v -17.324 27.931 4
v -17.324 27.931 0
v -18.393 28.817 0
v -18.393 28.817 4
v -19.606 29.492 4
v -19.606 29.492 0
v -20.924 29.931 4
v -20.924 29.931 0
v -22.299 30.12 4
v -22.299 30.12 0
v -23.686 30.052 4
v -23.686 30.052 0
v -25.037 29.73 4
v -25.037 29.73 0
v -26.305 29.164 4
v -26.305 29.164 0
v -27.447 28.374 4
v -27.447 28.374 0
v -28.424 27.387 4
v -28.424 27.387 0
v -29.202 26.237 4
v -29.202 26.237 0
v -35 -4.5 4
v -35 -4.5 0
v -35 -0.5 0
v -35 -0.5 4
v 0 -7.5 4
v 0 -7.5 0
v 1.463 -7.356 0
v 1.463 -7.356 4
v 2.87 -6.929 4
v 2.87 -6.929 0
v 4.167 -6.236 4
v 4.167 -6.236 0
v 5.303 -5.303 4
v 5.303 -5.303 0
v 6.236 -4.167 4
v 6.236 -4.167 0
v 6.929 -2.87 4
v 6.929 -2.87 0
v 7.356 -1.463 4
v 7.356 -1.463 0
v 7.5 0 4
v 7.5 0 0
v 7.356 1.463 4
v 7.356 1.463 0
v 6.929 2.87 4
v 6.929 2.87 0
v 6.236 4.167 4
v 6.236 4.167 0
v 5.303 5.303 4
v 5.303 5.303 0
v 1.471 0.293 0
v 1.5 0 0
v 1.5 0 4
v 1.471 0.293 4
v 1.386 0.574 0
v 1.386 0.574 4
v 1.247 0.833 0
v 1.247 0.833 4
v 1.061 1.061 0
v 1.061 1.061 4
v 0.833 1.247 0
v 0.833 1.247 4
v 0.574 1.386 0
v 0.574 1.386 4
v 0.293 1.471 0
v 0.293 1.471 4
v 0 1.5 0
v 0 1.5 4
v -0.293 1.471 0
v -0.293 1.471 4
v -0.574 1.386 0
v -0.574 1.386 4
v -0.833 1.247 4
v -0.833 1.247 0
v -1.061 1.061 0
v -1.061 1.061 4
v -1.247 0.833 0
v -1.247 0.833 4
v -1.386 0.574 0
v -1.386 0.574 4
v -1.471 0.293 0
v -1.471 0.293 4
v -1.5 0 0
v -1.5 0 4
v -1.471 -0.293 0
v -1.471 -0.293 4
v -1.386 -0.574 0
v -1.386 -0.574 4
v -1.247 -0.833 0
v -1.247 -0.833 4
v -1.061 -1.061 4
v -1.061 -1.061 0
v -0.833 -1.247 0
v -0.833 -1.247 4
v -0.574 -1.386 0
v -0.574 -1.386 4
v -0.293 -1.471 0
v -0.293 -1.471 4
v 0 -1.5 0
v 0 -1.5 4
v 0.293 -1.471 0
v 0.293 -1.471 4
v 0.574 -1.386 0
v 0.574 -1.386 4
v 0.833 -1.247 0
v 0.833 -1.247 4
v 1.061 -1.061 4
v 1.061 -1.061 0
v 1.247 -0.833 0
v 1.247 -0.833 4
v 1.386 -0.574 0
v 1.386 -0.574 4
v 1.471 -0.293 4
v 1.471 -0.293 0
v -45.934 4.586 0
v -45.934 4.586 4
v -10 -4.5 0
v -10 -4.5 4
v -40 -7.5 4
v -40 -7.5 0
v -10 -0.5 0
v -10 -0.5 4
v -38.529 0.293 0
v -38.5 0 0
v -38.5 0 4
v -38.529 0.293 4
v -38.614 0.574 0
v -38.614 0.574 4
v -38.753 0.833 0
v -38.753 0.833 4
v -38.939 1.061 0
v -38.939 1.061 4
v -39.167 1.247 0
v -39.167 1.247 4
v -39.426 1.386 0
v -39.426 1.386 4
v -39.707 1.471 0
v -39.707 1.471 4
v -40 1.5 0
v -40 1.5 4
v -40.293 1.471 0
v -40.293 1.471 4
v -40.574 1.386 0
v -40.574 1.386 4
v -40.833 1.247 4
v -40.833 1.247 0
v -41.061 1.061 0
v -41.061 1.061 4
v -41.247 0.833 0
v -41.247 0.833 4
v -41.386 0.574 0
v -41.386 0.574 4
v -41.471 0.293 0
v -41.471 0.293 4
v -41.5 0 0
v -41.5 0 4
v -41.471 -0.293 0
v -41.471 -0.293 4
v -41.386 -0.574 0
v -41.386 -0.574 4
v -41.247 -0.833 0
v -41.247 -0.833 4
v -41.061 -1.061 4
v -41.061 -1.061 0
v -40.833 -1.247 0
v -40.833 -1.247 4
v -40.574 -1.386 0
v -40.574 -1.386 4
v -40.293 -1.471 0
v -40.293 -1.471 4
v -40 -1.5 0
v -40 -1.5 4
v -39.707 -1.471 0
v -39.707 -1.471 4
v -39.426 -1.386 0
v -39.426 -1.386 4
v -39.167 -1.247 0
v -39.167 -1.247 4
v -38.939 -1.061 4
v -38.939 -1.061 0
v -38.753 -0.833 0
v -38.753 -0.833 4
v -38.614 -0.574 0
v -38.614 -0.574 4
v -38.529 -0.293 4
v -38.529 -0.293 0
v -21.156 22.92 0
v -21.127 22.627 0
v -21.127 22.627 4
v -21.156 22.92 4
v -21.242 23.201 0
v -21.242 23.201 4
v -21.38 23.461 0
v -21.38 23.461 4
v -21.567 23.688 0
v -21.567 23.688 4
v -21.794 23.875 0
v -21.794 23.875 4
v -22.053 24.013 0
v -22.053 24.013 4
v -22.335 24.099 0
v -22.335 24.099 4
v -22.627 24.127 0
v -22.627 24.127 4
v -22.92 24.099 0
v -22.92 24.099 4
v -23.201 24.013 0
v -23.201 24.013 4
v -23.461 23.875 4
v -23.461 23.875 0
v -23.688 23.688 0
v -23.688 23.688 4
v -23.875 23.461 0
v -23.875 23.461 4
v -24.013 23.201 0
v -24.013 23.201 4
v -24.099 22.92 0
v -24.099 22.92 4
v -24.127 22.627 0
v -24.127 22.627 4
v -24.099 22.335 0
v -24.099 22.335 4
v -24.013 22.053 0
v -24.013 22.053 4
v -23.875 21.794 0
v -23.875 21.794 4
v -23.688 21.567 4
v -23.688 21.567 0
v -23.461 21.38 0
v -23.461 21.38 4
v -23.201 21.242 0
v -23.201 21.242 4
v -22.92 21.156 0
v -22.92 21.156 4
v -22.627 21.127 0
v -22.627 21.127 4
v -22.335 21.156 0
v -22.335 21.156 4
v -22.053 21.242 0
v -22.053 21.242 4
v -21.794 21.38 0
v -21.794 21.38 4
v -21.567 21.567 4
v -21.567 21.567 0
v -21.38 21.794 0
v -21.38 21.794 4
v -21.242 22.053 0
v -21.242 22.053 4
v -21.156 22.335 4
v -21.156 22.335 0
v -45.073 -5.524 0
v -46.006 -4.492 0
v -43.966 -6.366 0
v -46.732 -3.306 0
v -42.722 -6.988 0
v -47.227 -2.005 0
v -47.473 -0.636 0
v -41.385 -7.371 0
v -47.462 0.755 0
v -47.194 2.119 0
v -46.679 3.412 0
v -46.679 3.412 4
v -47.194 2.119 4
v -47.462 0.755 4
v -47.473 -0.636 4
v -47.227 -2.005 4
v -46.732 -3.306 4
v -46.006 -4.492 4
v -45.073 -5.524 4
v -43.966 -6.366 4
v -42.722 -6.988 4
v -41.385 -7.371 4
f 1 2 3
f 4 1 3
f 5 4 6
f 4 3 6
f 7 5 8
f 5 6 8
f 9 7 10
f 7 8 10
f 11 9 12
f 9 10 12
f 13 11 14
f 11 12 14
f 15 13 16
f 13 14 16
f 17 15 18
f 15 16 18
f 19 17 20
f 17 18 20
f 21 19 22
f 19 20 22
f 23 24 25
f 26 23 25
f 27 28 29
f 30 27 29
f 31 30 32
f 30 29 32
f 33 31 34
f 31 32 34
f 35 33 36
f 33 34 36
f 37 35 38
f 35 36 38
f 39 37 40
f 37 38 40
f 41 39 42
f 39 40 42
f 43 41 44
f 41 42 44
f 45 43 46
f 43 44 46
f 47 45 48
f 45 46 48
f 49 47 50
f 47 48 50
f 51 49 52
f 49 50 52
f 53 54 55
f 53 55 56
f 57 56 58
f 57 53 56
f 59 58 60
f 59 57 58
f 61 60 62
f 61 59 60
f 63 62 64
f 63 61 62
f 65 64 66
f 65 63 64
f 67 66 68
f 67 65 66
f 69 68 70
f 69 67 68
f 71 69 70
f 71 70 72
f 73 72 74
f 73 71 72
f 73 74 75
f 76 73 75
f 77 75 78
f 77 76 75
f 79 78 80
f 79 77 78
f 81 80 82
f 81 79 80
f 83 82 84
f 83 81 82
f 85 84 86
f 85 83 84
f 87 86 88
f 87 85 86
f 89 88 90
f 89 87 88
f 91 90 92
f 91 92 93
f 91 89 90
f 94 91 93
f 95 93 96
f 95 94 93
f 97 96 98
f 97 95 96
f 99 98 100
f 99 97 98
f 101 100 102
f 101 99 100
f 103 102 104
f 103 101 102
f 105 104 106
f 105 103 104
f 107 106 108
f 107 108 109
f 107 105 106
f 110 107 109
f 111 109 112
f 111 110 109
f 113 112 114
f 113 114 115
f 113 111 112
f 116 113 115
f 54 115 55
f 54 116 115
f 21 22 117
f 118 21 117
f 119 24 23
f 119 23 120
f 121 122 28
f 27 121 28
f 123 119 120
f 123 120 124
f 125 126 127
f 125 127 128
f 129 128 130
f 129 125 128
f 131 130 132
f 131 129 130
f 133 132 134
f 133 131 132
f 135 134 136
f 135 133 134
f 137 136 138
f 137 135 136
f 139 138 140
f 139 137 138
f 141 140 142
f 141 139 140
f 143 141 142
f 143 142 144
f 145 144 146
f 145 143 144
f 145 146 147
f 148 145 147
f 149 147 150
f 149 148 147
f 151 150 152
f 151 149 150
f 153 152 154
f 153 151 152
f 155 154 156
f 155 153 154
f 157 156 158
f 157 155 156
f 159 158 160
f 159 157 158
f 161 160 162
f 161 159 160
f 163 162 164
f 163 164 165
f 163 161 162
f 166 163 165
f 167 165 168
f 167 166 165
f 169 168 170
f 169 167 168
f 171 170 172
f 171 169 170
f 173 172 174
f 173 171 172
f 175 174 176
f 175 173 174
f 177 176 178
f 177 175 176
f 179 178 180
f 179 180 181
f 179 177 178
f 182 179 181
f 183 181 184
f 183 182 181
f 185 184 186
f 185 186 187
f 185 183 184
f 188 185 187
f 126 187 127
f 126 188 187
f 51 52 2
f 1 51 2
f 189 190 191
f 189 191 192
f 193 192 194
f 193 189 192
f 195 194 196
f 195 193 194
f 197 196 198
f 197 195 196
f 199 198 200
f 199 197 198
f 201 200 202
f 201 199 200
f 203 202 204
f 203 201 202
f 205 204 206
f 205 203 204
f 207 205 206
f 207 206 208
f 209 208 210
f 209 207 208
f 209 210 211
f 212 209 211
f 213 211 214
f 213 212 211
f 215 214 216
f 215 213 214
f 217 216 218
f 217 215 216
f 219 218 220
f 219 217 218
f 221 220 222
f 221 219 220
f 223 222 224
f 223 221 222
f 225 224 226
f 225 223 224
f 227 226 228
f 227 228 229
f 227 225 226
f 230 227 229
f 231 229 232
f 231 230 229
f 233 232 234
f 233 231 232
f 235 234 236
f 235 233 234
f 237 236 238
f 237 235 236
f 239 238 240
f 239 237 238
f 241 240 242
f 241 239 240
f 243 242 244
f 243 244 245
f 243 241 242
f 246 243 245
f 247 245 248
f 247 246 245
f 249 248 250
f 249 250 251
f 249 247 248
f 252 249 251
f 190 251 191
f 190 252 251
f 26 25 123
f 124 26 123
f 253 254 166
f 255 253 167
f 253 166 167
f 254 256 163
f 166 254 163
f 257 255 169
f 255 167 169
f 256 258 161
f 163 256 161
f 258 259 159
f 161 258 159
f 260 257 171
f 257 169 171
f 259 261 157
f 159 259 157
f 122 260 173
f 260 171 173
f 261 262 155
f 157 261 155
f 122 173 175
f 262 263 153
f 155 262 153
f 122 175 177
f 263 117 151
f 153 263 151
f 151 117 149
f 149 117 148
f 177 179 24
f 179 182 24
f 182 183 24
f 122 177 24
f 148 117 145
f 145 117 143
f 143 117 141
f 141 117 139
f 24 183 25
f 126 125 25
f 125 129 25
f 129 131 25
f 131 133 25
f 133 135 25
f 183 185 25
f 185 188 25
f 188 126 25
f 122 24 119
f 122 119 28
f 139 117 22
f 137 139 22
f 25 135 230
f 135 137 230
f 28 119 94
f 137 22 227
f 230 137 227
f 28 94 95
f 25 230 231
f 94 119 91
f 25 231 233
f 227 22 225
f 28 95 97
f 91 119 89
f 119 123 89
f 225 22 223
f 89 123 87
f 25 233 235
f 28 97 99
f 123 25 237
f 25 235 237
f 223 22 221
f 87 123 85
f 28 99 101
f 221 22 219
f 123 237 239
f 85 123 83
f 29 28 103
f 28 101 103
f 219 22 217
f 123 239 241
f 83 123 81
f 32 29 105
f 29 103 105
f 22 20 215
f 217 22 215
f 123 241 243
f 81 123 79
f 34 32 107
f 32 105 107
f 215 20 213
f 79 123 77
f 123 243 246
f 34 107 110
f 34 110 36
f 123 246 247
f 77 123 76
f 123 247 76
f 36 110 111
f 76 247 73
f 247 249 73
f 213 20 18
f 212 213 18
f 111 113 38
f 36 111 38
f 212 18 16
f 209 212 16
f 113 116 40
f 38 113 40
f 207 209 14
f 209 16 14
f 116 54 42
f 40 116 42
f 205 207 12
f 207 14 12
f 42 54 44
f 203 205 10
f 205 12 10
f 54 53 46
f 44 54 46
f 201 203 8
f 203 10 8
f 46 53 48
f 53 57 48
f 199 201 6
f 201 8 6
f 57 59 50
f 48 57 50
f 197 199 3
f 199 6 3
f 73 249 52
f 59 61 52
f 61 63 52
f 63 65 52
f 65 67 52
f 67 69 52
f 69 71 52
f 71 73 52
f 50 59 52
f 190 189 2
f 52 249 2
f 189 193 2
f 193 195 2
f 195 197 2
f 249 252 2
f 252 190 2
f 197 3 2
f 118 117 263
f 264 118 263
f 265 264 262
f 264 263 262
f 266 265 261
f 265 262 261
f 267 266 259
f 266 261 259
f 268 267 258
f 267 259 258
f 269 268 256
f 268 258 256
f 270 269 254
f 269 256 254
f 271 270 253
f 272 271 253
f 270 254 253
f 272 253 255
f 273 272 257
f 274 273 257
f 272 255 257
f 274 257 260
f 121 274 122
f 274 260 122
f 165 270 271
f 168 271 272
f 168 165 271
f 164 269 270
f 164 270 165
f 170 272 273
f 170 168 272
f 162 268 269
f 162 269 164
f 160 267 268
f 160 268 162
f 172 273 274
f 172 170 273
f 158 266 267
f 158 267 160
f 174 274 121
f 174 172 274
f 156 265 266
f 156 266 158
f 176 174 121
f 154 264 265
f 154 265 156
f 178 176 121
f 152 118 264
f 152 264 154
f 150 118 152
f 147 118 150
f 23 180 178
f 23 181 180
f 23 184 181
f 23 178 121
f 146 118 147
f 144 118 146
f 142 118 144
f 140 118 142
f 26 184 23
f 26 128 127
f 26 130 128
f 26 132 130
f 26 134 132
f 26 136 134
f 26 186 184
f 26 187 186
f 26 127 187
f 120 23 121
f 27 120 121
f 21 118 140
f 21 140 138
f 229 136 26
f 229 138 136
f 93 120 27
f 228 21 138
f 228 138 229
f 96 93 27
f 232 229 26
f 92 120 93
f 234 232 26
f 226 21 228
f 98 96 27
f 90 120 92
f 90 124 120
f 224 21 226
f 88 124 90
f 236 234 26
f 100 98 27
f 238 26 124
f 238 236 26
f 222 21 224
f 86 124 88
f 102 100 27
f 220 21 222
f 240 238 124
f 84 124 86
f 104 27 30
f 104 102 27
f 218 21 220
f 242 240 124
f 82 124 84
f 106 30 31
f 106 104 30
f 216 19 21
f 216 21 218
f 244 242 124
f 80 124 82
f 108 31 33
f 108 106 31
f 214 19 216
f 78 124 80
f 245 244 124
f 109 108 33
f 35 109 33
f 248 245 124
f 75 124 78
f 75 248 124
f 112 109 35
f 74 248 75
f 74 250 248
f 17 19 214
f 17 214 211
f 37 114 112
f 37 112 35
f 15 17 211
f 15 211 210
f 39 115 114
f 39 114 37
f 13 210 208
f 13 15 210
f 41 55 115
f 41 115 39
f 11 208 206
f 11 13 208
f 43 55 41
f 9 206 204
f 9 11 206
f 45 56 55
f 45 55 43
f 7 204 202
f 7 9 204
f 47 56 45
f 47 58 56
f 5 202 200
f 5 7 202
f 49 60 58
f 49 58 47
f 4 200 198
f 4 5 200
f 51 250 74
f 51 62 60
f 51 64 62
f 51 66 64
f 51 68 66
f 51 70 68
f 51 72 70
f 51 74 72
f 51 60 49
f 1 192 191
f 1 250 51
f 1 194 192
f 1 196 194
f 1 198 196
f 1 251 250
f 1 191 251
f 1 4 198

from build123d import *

# Parameters (mm, degrees)
SCHIZZO1_R                   = 1.5
SCHIZZO1_W                   = 25
SCHIZZO1_H                   = 4
ESTRUSIONE_ESTRUSIONE2_DEPTH = 4


with BuildPart() as part:
    # Schizzo1 → Estrusione-Estrusione2 (new body)
    with BuildSketch(Plane.XY):
        with BuildLine():
            Line((-22.627416998, -7.5), (0, -7.5))
            ThreePointArc((0, -7.5), (6.929096494, -2.870125743), (5.303300859, 5.303300859))
            Line((5.303300859, 5.303300859), (-17.324116139, 27.930717857))
            ThreePointArc((-17.324116139, 27.930717857), (-23.686333927, 30.052287026), (-29.20181593, 26.236749163))
            Line((-29.20181593, 26.236749163), (-45.934294533, 4.586300077))
            ThreePointArc((-45.934294533, 4.586300077), (-46.732282324, -3.305506726), (-40, -7.5))
            Line((-40, -7.5), (-22.627416998, -7.5))
        make_face()
        Circle(SCHIZZO1_R, mode=Mode.SUBTRACT)
        with Locations((-22.627416998, 22.627416998)):
            Circle(SCHIZZO1_R, mode=Mode.SUBTRACT)
        with Locations((-40, 0)):
            Circle(SCHIZZO1_R, mode=Mode.SUBTRACT)
        with Locations((-22.5, -2.5)):
            Rectangle(SCHIZZO1_W, SCHIZZO1_H, mode=Mode.SUBTRACT)
    extrude(amount=ESTRUSIONE_ESTRUSIONE2_DEPTH)


solid = part.part
